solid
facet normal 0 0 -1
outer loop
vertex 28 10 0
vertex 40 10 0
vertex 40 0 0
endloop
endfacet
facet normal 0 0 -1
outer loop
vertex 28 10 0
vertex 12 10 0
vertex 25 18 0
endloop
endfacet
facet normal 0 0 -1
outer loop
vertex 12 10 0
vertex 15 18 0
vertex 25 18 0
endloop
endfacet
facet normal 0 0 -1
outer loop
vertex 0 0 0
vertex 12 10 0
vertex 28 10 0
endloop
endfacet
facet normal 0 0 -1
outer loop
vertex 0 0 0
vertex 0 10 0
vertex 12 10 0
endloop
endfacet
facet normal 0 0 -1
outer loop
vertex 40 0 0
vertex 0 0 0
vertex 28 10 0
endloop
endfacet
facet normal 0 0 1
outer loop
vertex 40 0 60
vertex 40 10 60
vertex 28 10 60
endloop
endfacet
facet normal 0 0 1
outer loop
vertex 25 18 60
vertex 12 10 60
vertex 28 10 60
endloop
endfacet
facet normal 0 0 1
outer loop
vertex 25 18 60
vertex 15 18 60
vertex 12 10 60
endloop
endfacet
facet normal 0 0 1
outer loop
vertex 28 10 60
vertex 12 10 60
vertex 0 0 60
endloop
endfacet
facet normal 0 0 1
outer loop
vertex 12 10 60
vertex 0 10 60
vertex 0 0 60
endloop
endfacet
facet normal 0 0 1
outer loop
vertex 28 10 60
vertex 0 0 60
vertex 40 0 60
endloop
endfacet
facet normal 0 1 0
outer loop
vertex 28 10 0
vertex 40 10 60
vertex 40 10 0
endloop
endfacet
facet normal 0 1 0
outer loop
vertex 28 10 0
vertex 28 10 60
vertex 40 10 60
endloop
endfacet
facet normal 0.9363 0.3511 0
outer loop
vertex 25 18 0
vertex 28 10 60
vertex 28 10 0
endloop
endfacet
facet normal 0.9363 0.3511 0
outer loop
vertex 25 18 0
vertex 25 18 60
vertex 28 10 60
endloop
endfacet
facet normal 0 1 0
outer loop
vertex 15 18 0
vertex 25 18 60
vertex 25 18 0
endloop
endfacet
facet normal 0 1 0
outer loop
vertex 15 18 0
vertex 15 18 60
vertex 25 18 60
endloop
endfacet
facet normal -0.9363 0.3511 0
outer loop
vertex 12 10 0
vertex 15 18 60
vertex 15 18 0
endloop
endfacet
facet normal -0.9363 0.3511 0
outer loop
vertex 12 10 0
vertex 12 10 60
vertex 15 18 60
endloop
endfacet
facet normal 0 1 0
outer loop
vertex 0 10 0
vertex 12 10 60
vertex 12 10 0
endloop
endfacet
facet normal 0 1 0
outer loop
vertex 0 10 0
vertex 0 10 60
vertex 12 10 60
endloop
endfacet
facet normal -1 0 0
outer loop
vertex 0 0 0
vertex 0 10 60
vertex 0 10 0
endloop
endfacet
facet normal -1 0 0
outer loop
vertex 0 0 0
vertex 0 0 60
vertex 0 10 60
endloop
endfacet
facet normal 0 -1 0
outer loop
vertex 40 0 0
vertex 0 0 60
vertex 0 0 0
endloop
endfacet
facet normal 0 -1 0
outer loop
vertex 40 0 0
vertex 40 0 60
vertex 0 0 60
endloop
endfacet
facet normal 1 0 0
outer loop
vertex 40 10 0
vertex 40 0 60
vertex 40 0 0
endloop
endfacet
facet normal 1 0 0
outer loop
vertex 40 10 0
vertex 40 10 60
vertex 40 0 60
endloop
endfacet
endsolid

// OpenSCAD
$fn = 32;

// ----------------------------------------------------------------------
// V guide rail: dovetail, 40 mm wide
// ----------------------------------------------------------------------

// --- parameters (mm) ---
rail_w = 40;              // rail width, X
base_t = 10;              // base plate thickness
v_depth = 8;              // V feature depth / height
v_half_w = 8;             // half width of the V at the base face
plate_t = 60;             // rail length, Z (the extrusion height)
top_half_w = 5;           // half width at the dovetail top

dovetail_base = 2 * v_half_w;  // dovetail width at the base
dovetail_top = 2 * top_half_w;  // dovetail width at the top

profile = [[0, 0], [40, 0], [40, 10], [28, 10], [25, 18], [15, 18], [12, 10], [0, 10]];  // primary outline, 8 points, counter clockwise

// --- the one profile operation ---
linear_extrude(height = plate_t) polygon(points = profile);
